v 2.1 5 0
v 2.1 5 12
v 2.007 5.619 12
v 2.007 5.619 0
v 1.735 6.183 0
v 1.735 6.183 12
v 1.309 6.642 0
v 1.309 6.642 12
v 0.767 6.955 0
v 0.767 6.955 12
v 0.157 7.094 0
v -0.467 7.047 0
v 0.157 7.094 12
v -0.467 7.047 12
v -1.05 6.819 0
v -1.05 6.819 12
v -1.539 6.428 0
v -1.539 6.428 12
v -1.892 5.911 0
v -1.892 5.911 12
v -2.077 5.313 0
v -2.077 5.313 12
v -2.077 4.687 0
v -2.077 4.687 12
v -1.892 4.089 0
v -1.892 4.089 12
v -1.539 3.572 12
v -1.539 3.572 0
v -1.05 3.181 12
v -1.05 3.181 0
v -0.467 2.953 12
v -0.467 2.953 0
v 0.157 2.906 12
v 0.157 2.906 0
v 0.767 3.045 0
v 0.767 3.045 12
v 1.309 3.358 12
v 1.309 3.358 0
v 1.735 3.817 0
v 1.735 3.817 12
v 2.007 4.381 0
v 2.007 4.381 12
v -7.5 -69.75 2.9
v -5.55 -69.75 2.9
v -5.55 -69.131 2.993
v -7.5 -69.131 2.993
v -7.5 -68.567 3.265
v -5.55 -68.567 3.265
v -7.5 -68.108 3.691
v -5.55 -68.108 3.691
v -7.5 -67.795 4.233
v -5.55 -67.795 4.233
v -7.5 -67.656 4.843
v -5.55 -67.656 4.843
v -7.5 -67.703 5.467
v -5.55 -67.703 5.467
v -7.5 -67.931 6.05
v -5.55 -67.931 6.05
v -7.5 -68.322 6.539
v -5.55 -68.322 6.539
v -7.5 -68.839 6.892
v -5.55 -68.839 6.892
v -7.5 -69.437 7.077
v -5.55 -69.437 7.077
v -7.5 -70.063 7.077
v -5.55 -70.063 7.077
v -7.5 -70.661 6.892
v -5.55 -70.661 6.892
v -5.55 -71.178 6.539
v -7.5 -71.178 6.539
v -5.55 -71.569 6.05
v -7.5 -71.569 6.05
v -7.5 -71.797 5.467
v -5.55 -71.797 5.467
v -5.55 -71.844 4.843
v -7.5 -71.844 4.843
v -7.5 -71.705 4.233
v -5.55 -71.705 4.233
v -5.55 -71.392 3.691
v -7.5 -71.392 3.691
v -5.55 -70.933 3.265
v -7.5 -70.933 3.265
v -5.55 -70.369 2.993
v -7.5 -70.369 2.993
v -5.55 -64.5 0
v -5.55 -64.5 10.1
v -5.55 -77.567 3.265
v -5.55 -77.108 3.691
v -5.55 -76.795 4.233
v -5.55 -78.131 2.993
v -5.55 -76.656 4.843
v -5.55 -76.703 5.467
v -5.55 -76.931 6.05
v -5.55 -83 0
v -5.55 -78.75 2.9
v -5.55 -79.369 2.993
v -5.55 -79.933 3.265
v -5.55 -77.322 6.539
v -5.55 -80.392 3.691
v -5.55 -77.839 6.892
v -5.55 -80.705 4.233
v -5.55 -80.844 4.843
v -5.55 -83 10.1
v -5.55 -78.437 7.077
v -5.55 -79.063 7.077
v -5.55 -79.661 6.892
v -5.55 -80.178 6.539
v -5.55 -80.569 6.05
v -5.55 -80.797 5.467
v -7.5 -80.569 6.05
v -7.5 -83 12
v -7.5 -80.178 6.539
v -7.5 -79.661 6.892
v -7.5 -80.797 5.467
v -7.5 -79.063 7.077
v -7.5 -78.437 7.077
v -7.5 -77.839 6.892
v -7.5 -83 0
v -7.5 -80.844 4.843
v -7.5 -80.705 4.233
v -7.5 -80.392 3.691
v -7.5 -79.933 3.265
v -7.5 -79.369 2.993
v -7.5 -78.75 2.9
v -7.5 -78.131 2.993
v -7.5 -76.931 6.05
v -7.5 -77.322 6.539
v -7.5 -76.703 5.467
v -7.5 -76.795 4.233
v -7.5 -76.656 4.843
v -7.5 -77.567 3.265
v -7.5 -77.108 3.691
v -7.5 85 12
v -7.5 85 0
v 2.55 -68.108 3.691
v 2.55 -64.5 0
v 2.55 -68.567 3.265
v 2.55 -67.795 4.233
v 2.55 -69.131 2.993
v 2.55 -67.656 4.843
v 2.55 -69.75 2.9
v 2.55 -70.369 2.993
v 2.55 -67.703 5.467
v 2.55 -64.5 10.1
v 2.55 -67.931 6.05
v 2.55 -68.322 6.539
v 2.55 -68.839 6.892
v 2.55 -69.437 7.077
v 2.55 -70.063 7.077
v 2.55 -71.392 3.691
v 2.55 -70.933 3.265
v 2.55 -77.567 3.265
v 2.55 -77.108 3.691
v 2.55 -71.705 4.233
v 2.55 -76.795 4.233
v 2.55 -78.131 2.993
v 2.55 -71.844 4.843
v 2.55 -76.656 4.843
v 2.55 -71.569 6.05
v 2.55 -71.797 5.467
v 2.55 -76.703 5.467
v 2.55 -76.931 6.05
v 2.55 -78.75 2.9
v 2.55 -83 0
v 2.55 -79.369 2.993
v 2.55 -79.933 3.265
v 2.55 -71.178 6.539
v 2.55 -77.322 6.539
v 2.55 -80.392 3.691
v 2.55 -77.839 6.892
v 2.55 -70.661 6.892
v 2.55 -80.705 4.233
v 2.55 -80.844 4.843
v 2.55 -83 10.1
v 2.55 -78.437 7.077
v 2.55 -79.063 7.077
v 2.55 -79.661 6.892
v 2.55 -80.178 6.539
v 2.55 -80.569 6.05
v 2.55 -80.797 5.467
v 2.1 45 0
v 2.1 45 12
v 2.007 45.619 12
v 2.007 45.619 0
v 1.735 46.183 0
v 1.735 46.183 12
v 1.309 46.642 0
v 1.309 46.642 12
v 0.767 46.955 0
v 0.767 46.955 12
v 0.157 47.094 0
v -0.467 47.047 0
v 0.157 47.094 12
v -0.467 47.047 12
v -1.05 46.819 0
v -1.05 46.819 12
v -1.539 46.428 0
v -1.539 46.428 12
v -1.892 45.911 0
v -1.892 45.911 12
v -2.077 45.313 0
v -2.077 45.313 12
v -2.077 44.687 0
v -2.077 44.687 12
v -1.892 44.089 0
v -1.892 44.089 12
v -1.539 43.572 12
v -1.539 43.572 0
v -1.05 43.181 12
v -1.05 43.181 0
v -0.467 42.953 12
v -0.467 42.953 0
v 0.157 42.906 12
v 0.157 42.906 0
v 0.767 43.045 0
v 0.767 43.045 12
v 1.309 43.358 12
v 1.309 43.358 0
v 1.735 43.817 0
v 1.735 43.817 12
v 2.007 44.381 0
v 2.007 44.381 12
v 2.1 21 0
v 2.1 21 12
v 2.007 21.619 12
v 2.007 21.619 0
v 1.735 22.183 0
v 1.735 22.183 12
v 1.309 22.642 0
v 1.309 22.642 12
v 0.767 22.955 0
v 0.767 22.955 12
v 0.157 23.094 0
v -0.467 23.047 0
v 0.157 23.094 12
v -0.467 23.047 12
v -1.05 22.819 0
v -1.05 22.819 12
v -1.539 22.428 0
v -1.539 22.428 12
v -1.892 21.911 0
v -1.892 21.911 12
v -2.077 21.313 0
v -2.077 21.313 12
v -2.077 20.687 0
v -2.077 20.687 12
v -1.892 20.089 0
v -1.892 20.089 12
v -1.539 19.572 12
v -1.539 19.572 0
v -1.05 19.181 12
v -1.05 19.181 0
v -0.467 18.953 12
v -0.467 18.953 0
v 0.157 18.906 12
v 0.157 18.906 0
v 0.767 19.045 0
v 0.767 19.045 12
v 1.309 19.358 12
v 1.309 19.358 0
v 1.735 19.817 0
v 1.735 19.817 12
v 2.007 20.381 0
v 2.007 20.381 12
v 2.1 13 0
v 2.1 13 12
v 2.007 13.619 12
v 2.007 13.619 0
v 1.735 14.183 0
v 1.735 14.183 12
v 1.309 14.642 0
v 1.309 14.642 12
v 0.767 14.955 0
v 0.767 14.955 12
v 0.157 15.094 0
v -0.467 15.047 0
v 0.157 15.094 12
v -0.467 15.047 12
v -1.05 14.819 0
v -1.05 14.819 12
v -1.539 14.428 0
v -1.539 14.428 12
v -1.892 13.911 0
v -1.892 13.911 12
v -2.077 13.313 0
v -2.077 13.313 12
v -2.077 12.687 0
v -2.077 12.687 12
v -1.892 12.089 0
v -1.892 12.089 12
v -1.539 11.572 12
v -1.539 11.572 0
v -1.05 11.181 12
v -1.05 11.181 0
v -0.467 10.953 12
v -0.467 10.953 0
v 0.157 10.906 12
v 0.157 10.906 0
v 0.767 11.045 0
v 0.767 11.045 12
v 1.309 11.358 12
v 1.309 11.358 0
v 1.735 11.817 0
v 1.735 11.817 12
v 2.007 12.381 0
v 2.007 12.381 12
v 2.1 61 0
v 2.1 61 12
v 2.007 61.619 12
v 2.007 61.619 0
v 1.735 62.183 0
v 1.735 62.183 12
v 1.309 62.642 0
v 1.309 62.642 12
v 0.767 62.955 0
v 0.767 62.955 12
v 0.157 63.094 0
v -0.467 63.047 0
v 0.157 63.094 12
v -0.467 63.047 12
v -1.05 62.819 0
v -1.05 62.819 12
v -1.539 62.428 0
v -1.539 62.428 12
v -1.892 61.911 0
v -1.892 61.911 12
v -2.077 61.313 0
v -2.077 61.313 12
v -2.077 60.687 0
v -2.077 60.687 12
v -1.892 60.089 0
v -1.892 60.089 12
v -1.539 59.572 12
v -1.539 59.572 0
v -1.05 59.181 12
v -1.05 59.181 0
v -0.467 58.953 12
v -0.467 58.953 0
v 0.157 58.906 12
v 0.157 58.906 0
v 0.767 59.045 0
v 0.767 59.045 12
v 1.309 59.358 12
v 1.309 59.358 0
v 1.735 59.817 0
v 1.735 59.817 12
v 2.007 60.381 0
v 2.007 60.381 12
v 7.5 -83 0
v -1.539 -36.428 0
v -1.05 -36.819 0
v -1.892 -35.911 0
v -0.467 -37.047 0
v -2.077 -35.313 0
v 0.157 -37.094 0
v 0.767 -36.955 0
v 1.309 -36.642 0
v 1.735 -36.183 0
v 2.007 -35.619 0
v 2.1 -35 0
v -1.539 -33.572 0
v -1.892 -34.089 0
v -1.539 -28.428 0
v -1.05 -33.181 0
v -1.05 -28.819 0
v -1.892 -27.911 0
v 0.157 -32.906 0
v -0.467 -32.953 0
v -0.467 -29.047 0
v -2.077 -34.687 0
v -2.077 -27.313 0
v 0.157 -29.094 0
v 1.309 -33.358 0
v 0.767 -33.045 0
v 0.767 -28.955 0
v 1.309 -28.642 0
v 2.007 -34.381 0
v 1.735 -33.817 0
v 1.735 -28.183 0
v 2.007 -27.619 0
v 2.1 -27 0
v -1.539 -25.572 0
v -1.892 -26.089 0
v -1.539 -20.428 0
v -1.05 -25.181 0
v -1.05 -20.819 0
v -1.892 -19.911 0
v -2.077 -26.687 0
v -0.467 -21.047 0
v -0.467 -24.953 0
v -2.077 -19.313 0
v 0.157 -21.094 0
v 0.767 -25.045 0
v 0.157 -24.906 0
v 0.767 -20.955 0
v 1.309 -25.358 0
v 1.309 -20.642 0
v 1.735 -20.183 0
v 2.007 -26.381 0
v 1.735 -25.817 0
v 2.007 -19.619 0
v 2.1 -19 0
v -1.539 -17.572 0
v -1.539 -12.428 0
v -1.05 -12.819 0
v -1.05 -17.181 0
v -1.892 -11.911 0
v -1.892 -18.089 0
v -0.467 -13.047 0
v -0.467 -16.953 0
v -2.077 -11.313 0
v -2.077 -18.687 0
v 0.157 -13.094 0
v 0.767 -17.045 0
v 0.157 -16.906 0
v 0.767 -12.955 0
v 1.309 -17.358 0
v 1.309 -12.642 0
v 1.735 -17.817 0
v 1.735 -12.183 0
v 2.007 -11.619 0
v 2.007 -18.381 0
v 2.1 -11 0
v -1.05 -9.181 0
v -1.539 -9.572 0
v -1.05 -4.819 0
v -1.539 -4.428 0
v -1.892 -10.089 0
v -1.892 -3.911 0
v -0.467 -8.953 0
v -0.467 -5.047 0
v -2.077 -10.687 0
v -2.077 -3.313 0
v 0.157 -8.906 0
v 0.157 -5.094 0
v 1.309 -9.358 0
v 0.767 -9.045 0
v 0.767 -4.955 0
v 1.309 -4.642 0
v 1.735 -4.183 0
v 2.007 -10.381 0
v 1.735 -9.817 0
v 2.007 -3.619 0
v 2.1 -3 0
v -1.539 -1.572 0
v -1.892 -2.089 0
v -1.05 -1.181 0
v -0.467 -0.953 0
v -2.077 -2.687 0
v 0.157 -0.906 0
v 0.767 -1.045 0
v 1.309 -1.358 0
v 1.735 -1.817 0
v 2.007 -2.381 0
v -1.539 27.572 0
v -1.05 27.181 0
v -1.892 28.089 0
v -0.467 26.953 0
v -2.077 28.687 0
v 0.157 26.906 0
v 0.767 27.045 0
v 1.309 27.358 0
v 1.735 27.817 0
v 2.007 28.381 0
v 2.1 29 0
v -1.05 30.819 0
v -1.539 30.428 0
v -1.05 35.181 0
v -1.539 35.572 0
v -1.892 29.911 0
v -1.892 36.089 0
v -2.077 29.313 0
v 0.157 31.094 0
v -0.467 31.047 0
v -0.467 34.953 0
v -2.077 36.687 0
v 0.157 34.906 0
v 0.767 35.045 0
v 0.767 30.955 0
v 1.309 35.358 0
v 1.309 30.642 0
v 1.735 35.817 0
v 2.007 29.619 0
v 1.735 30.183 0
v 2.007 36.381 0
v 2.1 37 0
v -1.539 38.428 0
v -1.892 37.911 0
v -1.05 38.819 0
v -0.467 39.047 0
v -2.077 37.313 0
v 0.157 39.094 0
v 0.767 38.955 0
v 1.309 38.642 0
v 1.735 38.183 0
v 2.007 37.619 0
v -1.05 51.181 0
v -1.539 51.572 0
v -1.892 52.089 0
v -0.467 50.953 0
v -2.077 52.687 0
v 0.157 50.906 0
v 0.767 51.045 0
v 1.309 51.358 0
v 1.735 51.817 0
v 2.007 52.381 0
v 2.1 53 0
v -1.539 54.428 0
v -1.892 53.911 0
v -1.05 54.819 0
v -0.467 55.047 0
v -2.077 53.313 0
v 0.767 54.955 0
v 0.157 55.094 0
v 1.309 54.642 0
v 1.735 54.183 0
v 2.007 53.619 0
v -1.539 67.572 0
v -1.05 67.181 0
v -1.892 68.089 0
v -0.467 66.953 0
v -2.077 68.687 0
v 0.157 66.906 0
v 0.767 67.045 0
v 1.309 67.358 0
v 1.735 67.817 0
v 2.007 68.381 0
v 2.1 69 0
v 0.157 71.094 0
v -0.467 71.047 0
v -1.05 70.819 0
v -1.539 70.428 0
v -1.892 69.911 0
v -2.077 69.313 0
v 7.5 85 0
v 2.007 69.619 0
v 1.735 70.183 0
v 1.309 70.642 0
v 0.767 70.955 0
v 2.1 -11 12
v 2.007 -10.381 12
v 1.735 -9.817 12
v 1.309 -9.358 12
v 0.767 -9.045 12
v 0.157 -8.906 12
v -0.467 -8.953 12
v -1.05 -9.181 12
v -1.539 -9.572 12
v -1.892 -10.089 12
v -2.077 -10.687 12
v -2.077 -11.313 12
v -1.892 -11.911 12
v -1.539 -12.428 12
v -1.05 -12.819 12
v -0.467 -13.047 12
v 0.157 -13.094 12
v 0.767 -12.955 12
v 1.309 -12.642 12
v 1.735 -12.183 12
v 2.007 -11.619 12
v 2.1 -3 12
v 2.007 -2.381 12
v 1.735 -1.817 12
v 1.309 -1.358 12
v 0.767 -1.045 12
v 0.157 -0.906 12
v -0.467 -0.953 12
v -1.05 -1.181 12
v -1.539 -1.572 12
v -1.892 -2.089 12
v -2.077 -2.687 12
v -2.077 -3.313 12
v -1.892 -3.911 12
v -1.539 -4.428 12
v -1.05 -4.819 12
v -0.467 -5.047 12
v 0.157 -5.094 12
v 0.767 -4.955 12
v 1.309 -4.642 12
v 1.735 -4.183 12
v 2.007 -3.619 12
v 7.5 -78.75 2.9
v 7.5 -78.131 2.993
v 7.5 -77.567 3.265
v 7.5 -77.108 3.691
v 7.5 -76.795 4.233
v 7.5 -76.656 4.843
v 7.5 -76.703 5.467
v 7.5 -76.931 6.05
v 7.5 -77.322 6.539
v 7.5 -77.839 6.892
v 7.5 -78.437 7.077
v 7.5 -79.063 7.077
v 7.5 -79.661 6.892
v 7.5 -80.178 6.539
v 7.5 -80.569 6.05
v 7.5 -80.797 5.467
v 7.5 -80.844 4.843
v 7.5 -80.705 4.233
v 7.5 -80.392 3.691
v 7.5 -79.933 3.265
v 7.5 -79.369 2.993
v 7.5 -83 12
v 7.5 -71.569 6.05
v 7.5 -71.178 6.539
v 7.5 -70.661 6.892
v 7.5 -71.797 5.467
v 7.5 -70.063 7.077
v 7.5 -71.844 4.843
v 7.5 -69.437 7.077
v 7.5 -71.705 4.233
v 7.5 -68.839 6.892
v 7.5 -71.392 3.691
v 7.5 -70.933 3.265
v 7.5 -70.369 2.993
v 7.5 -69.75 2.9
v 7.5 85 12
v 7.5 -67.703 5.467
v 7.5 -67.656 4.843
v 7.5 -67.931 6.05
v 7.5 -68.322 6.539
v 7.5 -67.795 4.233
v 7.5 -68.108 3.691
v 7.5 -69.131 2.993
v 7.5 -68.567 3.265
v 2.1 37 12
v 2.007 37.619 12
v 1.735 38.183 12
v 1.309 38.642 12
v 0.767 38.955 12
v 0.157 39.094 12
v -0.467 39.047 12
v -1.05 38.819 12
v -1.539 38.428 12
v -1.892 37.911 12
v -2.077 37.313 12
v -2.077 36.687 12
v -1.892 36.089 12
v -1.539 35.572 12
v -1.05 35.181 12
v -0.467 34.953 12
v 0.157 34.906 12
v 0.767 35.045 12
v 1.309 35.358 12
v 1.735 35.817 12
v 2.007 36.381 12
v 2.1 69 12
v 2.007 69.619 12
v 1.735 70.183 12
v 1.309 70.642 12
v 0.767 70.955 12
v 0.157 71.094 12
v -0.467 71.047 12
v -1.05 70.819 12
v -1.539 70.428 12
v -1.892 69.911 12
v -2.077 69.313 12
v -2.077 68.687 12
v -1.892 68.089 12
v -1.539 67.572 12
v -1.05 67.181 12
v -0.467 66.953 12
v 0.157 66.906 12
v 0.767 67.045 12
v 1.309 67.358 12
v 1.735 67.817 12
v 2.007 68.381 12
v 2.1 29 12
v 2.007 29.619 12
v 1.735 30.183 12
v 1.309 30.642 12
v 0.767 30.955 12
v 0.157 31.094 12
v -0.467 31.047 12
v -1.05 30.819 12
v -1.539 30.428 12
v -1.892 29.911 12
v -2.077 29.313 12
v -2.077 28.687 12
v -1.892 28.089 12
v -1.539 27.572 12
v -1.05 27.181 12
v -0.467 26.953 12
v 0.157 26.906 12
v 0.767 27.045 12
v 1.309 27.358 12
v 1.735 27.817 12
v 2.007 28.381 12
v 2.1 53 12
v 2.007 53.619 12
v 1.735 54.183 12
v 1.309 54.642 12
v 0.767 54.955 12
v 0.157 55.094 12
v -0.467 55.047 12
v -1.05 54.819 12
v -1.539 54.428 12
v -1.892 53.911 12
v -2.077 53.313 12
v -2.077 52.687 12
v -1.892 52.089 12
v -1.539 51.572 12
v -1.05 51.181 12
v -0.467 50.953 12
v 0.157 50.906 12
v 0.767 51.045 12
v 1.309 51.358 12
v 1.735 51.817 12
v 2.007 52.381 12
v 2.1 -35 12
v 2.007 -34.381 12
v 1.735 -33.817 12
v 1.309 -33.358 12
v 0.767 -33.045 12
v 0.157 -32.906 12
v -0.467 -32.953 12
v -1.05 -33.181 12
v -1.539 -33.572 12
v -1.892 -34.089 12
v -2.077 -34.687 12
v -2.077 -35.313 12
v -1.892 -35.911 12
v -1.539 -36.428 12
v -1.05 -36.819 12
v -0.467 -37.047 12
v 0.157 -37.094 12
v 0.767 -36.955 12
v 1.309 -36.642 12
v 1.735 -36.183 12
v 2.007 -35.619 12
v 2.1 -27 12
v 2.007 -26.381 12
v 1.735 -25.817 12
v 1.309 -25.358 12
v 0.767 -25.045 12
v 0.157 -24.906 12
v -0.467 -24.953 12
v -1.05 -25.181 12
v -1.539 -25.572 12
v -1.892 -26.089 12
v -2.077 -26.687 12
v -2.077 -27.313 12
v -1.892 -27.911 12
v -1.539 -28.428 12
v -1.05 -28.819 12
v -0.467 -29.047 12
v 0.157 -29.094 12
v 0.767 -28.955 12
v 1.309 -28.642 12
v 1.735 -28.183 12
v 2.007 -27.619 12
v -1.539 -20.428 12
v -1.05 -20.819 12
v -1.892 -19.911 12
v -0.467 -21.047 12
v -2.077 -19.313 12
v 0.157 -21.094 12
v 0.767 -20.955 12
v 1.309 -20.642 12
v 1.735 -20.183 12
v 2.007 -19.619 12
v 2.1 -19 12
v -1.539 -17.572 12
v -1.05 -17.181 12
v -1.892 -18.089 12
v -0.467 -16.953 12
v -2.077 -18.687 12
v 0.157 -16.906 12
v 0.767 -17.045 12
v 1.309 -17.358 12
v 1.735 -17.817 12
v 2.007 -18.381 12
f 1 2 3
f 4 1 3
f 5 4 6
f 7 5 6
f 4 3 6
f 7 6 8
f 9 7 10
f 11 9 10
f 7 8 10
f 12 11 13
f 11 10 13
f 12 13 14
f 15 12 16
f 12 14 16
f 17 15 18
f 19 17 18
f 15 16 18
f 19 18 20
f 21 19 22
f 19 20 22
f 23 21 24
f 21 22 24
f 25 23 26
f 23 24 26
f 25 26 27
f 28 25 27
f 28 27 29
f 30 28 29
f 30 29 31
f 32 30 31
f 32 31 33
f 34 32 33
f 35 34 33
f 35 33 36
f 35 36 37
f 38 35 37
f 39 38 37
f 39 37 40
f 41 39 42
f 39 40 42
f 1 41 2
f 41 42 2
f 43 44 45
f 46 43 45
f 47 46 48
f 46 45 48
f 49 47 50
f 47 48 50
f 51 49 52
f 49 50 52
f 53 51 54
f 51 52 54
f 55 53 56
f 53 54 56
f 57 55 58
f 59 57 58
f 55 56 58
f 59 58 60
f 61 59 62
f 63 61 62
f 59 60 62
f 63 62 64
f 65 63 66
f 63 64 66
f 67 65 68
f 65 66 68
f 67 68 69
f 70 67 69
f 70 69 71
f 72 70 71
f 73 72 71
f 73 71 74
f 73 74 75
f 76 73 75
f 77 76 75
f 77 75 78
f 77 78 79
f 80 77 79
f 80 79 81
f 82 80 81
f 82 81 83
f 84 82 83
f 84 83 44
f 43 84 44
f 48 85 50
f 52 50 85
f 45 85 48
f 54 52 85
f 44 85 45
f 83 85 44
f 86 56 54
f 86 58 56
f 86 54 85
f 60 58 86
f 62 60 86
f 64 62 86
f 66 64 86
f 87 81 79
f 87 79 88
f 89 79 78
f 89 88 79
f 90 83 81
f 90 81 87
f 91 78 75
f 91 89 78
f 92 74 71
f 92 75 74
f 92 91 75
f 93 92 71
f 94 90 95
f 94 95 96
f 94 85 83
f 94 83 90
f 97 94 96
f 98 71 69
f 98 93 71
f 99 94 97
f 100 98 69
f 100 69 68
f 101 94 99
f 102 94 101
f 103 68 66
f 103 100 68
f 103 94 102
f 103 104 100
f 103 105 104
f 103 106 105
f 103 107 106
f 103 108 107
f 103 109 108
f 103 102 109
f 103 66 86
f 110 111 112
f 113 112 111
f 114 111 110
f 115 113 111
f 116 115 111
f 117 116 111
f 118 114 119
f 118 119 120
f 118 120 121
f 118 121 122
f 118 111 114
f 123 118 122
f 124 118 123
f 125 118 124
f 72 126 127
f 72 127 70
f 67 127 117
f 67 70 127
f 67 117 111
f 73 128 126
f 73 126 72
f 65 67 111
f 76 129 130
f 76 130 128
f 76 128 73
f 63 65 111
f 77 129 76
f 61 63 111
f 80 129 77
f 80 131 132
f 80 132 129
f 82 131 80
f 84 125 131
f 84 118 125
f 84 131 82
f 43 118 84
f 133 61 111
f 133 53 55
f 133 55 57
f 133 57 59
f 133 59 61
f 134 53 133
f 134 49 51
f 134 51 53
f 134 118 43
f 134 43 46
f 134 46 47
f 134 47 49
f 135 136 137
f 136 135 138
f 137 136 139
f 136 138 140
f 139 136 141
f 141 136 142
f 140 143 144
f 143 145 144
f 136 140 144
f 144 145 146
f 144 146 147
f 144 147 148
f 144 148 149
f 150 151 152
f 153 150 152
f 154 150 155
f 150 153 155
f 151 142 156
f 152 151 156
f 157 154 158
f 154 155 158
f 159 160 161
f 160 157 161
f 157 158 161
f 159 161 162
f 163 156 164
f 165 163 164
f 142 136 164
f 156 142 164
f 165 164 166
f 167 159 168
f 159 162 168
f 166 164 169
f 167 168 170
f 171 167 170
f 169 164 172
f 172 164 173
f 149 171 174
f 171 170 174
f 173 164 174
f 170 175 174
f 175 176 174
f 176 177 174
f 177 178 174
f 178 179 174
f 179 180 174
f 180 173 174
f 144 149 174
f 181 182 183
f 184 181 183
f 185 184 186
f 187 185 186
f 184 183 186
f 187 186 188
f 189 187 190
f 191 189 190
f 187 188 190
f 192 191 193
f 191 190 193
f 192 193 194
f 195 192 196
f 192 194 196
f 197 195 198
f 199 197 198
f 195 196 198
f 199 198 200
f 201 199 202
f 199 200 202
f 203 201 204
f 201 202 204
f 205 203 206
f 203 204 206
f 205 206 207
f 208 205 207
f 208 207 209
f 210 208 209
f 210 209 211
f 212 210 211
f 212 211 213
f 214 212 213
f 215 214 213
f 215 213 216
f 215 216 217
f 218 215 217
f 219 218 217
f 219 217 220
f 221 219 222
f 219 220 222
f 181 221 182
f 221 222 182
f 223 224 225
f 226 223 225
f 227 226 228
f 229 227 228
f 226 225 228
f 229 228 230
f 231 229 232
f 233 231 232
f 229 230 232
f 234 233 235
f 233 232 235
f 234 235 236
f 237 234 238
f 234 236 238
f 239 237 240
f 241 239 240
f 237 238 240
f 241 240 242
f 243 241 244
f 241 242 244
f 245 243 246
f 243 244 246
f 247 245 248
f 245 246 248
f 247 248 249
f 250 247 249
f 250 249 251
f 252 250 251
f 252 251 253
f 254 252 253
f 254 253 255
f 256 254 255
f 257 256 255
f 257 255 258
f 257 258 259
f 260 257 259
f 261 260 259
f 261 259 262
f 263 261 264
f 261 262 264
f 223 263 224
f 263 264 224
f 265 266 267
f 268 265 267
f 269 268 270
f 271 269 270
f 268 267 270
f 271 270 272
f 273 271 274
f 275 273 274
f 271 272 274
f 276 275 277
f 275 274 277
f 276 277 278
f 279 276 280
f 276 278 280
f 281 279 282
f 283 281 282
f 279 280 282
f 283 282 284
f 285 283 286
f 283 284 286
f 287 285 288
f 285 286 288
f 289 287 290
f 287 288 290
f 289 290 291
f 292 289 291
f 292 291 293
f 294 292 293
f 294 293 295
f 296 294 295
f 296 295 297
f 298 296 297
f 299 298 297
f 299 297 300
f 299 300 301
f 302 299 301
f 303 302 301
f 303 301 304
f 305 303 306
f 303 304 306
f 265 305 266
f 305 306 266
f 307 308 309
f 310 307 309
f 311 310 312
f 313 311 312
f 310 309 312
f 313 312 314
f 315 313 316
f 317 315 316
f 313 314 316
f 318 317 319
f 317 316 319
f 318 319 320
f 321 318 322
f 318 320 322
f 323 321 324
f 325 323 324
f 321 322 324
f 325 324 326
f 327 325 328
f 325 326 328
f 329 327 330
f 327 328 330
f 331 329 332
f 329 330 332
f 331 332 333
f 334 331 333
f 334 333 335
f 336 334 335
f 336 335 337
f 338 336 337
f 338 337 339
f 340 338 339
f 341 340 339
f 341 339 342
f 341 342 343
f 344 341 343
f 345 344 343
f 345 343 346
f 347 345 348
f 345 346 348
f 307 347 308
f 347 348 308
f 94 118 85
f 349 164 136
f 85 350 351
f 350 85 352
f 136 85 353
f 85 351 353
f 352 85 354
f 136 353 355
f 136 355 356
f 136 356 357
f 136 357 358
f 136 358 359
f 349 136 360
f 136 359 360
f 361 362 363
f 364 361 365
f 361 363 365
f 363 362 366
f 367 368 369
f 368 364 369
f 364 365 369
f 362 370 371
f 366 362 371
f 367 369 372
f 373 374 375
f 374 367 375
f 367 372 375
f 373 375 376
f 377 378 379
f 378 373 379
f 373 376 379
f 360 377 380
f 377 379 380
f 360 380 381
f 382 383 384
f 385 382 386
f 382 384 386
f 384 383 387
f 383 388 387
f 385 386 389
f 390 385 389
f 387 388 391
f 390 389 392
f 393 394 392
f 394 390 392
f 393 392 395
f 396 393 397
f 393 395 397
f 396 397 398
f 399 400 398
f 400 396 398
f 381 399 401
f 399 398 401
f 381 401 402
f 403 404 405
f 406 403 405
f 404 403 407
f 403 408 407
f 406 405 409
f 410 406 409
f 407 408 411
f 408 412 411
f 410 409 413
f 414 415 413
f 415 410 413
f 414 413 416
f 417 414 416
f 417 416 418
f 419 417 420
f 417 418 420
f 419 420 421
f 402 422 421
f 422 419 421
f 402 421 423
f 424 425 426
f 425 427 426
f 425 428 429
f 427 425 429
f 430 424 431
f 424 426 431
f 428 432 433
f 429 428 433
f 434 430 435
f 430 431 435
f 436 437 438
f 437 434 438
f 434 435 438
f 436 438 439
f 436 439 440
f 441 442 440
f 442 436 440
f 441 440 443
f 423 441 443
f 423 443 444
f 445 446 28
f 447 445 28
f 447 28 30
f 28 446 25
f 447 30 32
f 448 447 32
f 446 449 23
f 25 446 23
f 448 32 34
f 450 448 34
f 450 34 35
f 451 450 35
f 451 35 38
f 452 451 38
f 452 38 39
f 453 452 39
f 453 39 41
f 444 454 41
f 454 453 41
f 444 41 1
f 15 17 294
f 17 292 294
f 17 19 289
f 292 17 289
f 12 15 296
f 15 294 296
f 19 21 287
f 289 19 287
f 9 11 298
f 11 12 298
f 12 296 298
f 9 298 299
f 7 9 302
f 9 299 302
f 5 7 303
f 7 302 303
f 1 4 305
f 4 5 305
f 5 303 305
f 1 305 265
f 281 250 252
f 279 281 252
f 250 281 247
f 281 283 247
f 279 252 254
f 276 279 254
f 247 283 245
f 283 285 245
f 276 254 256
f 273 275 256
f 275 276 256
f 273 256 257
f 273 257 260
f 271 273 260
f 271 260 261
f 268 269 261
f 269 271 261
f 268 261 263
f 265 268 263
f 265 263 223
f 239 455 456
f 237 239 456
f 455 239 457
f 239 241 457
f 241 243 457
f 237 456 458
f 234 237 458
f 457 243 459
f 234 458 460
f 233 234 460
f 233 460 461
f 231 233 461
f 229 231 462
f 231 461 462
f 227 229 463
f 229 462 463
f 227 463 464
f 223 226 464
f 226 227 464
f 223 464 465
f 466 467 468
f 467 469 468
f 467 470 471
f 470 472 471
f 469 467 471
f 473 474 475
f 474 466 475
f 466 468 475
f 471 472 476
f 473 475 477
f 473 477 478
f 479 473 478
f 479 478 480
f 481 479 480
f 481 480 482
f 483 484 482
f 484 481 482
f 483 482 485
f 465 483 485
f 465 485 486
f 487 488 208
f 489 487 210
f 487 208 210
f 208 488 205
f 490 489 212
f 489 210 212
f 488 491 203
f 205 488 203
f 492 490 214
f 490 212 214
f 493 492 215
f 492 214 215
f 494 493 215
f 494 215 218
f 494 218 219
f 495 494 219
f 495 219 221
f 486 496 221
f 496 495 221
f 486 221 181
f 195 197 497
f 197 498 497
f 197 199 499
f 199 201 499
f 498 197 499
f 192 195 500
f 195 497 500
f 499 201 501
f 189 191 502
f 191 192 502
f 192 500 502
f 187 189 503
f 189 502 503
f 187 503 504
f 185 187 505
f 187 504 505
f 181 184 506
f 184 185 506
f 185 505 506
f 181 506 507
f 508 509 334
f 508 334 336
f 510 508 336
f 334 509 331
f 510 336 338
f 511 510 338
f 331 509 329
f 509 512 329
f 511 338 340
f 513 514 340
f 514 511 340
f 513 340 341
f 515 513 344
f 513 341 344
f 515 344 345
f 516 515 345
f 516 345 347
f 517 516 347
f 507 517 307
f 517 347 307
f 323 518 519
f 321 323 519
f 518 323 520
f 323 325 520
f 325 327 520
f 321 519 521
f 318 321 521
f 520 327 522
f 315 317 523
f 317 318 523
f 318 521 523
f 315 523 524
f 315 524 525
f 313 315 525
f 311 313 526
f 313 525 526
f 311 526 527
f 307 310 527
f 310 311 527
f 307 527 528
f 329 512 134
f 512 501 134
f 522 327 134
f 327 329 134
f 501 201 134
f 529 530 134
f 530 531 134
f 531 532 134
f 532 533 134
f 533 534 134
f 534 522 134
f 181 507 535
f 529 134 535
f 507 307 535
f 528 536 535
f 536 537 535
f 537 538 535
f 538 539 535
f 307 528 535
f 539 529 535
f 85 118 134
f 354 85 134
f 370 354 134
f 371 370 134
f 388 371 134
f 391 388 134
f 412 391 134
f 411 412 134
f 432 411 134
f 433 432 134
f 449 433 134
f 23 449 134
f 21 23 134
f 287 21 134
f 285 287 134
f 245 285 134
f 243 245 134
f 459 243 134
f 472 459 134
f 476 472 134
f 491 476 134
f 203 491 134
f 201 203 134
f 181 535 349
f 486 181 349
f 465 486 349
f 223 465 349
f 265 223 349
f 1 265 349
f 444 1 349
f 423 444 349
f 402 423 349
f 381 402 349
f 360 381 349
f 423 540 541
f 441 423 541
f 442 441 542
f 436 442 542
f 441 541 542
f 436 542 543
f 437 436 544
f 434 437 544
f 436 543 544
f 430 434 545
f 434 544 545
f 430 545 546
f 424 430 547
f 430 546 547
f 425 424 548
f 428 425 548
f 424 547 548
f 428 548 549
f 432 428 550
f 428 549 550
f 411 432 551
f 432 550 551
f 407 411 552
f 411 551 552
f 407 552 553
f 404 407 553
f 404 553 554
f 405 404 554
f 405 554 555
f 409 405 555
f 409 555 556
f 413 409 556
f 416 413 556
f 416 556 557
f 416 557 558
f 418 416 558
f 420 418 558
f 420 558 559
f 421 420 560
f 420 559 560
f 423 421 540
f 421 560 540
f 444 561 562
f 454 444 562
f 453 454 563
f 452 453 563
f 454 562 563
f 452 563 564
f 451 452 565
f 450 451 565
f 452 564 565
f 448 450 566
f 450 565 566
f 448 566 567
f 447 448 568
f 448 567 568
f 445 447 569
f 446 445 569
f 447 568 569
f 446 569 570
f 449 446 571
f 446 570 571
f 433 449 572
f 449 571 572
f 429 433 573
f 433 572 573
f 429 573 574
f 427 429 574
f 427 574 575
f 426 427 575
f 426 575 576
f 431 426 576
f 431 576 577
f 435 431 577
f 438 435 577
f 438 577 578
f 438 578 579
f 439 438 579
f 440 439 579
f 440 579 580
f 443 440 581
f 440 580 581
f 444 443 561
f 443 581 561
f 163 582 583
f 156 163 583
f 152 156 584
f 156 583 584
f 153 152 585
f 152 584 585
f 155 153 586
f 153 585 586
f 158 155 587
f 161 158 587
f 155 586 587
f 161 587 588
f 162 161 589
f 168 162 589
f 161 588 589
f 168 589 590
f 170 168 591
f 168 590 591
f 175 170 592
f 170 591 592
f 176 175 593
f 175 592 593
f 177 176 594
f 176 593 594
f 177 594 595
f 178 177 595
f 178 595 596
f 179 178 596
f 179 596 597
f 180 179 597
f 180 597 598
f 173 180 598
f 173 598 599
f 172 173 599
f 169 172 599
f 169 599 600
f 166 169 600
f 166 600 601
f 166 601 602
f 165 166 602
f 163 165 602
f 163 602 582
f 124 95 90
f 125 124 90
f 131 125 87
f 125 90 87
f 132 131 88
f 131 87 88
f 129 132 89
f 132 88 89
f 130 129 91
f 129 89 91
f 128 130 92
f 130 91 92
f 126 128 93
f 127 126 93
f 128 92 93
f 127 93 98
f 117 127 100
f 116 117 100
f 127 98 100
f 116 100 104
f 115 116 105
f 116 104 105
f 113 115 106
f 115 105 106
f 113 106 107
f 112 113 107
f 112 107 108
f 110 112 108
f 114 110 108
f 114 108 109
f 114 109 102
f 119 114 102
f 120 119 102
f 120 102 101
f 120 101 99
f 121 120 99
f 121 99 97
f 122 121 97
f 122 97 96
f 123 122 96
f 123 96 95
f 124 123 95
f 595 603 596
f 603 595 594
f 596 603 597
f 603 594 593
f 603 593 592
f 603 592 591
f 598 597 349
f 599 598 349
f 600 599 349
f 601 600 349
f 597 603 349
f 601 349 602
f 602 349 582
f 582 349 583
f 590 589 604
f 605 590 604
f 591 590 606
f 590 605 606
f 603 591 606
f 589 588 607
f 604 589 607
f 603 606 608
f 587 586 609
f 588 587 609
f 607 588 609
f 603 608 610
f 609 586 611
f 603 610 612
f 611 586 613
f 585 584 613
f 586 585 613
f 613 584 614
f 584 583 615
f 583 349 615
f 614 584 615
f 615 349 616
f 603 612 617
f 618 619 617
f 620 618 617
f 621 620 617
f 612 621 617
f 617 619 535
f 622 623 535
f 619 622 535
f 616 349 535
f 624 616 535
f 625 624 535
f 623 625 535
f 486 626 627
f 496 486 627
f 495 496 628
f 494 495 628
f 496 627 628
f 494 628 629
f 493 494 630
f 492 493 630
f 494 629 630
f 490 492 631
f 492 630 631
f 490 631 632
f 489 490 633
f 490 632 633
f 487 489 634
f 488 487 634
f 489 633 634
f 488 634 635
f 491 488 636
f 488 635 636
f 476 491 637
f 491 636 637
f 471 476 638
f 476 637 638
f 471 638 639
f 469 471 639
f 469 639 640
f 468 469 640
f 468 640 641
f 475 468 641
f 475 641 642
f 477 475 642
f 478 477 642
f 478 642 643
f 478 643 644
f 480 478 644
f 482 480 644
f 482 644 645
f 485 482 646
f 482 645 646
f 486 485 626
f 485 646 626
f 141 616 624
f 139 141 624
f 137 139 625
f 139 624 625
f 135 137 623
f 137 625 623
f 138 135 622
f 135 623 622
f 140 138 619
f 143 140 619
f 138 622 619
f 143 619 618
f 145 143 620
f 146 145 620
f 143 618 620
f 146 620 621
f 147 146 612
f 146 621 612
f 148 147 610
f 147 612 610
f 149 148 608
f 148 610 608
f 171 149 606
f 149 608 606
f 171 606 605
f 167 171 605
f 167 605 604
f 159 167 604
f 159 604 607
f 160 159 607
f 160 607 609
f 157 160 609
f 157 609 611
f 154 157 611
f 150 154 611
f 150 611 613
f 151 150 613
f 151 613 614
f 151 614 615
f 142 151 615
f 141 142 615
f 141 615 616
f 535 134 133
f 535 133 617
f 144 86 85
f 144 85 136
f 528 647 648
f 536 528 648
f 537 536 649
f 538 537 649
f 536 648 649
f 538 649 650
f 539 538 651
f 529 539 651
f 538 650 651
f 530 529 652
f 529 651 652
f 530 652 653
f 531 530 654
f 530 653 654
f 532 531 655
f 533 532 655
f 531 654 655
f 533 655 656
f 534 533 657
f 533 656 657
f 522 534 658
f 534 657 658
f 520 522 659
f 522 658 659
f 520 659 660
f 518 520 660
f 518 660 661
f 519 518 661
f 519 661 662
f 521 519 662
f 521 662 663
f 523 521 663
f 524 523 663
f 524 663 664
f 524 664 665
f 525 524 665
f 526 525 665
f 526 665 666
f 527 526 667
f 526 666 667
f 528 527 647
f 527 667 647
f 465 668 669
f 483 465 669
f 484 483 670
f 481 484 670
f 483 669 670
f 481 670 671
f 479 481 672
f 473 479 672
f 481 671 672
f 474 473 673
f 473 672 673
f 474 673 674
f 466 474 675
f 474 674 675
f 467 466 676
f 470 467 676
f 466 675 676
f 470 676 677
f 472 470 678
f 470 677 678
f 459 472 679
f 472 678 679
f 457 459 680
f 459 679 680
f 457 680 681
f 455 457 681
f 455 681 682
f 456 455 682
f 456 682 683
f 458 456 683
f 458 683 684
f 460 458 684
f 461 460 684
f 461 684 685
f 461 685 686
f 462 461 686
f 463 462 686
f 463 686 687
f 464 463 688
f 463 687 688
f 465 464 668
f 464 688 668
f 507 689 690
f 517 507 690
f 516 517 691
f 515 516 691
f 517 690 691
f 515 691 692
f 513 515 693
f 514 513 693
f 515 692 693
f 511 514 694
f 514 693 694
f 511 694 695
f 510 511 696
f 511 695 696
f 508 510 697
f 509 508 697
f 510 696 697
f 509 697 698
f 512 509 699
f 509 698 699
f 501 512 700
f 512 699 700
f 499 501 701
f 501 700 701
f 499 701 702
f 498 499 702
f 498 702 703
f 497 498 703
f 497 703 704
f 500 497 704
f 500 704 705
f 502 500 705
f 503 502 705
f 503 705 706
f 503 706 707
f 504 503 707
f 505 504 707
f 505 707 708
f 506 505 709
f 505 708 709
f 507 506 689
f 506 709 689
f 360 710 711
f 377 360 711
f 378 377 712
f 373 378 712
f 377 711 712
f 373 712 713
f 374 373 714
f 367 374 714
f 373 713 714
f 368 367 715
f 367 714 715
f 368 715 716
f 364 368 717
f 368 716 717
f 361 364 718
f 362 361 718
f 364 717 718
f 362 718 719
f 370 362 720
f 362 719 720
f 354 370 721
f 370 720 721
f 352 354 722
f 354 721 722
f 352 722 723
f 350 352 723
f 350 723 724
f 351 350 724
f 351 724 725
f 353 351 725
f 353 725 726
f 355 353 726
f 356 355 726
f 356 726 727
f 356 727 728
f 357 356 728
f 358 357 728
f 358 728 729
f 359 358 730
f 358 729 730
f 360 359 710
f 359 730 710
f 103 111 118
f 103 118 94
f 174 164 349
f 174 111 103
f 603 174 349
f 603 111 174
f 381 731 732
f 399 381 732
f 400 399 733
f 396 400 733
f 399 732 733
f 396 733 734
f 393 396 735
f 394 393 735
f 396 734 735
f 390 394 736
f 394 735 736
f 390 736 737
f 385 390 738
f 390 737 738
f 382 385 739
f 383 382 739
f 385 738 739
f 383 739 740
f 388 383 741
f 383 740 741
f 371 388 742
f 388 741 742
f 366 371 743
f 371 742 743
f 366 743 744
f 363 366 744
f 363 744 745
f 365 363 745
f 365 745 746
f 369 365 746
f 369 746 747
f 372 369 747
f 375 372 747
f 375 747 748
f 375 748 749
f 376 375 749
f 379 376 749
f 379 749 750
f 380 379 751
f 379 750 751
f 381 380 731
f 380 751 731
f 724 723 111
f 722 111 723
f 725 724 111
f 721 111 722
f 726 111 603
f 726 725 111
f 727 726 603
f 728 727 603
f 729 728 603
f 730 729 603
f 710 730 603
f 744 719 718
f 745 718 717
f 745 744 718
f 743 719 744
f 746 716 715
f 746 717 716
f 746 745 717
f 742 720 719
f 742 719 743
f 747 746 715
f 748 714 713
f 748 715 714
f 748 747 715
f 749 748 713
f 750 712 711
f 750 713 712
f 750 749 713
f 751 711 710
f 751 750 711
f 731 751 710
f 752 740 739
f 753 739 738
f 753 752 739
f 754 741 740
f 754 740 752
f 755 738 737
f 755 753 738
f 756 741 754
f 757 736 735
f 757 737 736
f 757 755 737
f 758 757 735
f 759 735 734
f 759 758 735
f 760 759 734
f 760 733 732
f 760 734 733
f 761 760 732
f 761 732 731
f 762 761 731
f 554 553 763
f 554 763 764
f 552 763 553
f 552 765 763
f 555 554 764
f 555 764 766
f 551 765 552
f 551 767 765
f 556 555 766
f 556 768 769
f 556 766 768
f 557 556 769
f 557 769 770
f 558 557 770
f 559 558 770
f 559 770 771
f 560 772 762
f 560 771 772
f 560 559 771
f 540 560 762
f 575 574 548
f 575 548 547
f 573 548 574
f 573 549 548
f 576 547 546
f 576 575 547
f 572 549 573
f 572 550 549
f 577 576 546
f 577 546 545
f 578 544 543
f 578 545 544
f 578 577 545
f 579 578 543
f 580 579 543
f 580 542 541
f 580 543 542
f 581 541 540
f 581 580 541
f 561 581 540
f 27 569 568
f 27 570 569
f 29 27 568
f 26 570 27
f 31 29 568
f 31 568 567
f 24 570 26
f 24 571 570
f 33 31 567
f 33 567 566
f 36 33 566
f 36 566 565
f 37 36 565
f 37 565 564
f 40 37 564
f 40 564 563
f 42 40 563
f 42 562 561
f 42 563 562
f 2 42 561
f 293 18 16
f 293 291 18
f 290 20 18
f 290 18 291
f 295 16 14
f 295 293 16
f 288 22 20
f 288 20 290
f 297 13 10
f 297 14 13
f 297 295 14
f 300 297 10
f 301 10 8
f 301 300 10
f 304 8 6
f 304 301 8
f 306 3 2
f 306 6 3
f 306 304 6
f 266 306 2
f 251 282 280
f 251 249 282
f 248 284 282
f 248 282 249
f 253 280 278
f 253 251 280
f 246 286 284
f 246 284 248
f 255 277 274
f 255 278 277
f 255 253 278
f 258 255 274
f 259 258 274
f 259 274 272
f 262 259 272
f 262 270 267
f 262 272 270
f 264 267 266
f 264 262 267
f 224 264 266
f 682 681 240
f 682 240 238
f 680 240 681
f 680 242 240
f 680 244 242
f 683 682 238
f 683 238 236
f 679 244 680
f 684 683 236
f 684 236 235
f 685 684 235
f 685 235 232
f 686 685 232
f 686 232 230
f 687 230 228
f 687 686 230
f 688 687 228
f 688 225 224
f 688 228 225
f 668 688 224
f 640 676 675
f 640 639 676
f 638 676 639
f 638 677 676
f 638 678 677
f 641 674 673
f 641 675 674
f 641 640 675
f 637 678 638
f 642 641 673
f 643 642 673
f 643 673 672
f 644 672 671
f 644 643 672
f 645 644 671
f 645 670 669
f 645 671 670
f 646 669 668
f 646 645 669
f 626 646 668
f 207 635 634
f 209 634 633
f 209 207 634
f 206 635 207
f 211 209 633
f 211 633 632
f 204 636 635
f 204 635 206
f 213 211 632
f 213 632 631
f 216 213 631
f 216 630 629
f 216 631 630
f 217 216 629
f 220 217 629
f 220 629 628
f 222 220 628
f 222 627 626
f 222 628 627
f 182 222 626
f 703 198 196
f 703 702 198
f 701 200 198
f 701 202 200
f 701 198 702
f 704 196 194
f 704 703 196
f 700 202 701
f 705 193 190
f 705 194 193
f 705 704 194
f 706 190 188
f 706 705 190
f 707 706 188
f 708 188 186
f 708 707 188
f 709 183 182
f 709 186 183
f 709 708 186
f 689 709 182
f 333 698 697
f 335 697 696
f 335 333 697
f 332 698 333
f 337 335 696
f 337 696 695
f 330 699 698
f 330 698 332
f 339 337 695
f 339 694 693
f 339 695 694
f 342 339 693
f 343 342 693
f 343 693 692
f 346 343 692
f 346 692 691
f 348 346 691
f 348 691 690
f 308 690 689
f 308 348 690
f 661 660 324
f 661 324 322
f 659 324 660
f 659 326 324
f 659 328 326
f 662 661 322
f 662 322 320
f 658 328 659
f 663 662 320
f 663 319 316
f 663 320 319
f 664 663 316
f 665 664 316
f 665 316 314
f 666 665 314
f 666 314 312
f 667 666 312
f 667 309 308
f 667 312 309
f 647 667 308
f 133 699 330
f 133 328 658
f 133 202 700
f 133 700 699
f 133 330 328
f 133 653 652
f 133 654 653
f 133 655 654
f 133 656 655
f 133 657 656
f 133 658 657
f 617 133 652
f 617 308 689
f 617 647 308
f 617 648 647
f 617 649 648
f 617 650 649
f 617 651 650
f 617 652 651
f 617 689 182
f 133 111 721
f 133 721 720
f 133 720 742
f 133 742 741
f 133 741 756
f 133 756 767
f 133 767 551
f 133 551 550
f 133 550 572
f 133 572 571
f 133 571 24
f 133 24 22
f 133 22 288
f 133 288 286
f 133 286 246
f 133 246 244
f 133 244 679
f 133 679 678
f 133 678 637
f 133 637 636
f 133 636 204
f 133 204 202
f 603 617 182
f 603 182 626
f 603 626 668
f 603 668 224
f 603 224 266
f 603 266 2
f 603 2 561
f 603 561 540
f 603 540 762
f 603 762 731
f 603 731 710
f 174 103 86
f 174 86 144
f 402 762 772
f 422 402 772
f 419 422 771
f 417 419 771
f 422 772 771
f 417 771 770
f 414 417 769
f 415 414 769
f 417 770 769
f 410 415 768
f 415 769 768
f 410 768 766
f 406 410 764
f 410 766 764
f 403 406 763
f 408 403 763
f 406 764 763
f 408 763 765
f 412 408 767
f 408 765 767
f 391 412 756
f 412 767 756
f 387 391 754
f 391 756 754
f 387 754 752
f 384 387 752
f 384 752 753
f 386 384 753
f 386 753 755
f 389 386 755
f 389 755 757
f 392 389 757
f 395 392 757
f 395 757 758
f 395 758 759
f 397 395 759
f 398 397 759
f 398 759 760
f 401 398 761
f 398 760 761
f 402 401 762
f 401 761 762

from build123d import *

# Parameters (mm, degrees)
SKETCH_1_W          = 15
SKETCH_1_H          = 170
EXTRUDE_1_DEPTH     = 12
SKETCH_2_W          = 8.1
SKETCH_2_H          = 10.1
CUT_EXTRUDE_1_DEPTH = 20.5
CUT_EXTRUDE_2_REACH = 89.144
SKETCH_3_R          = 2.1
SKETCH_5_R          = 2.1
CUT_EXTRUDE_3_DEPTH = 12
SKETCH_6_W          = 15
SKETCH_6_H          = 12
CUT_EXTRUDE_4_DEPTH = 2


with BuildPart() as part:
    # 草图1 → 凸台-拉伸1 (new body)
    with BuildSketch(Plane.XY):
        Rectangle(SKETCH_1_W, SKETCH_1_H)
    extrude(amount=EXTRUDE_1_DEPTH)

    # 草图2 → 切除-拉伸1 (cut)
    with BuildSketch(Plane.XZ.offset(85)):
        with Locations((-1.5, 5.05)):
            Rectangle(SKETCH_2_W, SKETCH_2_H)
    extrude(amount=-CUT_EXTRUDE_1_DEPTH, mode=Mode.SUBTRACT)

    # 切除-拉伸2: up to this face of the body (flat: up to its plane)
    cut_extrude_2_end = Plane(part.part.faces().sort_by_distance((-7.5, 0, 6))[0])
    # 草图3 → 切除-拉伸2 (cut, up to the picked face)
    with BuildSketch(Plane(origin=(7.5, 0, 0), x_dir=(0, 0, -1), z_dir=(1, 0, 0)), mode=Mode.PRIVATE) as cut_extrude_2_sk1:
        with Locations((-5, -69.75)):
            Circle(SKETCH_3_R)
    cut_extrude_2_tool1 = split(extrude(cut_extrude_2_sk1.sketch, amount=-CUT_EXTRUDE_2_REACH, mode=Mode.PRIVATE), bisect_by=cut_extrude_2_end, keep=Keep.BOTH, mode=Mode.PRIVATE)
    # 草图3 → 切除-拉伸2 (cut, up to the picked face)
    with BuildSketch(Plane(origin=(7.5, 0, 0), x_dir=(0, 0, -1), z_dir=(1, 0, 0)), mode=Mode.PRIVATE) as cut_extrude_2_sk2:
        with Locations((-5, -78.75)):
            Circle(SKETCH_3_R)
    cut_extrude_2_tool2 = split(extrude(cut_extrude_2_sk2.sketch, amount=-CUT_EXTRUDE_2_REACH, mode=Mode.PRIVATE), bisect_by=cut_extrude_2_end, keep=Keep.BOTH, mode=Mode.PRIVATE)
    add(cut_extrude_2_tool1.solids().sort_by(Axis((7.5, -69.75, 5), (-1, 0, 0)))[0], mode=Mode.SUBTRACT)
    add(cut_extrude_2_tool2.solids().sort_by(Axis((7.5, -78.75, 5), (-1, 0, 0)))[0], mode=Mode.SUBTRACT)

    # 草图5 → 切除-拉伸3 (cut)
    with BuildSketch(Plane.XY.offset(12)):
        with Locations((0, -27)):
            Circle(SKETCH_5_R)
        with Locations((0, -35)):
            Circle(SKETCH_5_R)
        with Locations((0, -19)):
            Circle(SKETCH_5_R)
        with Locations((0, -11)):
            Circle(SKETCH_5_R)
        with Locations((0, -3)):
            Circle(SKETCH_5_R)
        with Locations((0, 5)):
            Circle(SKETCH_5_R)
        with Locations((0, 13)):
            Circle(SKETCH_5_R)
        with Locations((0, 21)):
            Circle(SKETCH_5_R)
        with Locations((0, 29)):
            Circle(SKETCH_5_R)
        with Locations((0, 37)):
            Circle(SKETCH_5_R)
        with Locations((0, 45)):
            Circle(SKETCH_5_R)
        with Locations((0, 53)):
            Circle(SKETCH_5_R)
        with Locations((0, 61)):
            Circle(SKETCH_5_R)
        with Locations((0, 69)):
            Circle(SKETCH_5_R)
    extrude(amount=-CUT_EXTRUDE_3_DEPTH, mode=Mode.SUBTRACT)

    # 草图6 → 切除-拉伸4 (cut)
    with BuildSketch(Plane.XZ.offset(85)):
        with Locations((0, 6)):
            Rectangle(SKETCH_6_W, SKETCH_6_H)
    extrude(amount=-CUT_EXTRUDE_4_DEPTH, mode=Mode.SUBTRACT)


solid = part.part
